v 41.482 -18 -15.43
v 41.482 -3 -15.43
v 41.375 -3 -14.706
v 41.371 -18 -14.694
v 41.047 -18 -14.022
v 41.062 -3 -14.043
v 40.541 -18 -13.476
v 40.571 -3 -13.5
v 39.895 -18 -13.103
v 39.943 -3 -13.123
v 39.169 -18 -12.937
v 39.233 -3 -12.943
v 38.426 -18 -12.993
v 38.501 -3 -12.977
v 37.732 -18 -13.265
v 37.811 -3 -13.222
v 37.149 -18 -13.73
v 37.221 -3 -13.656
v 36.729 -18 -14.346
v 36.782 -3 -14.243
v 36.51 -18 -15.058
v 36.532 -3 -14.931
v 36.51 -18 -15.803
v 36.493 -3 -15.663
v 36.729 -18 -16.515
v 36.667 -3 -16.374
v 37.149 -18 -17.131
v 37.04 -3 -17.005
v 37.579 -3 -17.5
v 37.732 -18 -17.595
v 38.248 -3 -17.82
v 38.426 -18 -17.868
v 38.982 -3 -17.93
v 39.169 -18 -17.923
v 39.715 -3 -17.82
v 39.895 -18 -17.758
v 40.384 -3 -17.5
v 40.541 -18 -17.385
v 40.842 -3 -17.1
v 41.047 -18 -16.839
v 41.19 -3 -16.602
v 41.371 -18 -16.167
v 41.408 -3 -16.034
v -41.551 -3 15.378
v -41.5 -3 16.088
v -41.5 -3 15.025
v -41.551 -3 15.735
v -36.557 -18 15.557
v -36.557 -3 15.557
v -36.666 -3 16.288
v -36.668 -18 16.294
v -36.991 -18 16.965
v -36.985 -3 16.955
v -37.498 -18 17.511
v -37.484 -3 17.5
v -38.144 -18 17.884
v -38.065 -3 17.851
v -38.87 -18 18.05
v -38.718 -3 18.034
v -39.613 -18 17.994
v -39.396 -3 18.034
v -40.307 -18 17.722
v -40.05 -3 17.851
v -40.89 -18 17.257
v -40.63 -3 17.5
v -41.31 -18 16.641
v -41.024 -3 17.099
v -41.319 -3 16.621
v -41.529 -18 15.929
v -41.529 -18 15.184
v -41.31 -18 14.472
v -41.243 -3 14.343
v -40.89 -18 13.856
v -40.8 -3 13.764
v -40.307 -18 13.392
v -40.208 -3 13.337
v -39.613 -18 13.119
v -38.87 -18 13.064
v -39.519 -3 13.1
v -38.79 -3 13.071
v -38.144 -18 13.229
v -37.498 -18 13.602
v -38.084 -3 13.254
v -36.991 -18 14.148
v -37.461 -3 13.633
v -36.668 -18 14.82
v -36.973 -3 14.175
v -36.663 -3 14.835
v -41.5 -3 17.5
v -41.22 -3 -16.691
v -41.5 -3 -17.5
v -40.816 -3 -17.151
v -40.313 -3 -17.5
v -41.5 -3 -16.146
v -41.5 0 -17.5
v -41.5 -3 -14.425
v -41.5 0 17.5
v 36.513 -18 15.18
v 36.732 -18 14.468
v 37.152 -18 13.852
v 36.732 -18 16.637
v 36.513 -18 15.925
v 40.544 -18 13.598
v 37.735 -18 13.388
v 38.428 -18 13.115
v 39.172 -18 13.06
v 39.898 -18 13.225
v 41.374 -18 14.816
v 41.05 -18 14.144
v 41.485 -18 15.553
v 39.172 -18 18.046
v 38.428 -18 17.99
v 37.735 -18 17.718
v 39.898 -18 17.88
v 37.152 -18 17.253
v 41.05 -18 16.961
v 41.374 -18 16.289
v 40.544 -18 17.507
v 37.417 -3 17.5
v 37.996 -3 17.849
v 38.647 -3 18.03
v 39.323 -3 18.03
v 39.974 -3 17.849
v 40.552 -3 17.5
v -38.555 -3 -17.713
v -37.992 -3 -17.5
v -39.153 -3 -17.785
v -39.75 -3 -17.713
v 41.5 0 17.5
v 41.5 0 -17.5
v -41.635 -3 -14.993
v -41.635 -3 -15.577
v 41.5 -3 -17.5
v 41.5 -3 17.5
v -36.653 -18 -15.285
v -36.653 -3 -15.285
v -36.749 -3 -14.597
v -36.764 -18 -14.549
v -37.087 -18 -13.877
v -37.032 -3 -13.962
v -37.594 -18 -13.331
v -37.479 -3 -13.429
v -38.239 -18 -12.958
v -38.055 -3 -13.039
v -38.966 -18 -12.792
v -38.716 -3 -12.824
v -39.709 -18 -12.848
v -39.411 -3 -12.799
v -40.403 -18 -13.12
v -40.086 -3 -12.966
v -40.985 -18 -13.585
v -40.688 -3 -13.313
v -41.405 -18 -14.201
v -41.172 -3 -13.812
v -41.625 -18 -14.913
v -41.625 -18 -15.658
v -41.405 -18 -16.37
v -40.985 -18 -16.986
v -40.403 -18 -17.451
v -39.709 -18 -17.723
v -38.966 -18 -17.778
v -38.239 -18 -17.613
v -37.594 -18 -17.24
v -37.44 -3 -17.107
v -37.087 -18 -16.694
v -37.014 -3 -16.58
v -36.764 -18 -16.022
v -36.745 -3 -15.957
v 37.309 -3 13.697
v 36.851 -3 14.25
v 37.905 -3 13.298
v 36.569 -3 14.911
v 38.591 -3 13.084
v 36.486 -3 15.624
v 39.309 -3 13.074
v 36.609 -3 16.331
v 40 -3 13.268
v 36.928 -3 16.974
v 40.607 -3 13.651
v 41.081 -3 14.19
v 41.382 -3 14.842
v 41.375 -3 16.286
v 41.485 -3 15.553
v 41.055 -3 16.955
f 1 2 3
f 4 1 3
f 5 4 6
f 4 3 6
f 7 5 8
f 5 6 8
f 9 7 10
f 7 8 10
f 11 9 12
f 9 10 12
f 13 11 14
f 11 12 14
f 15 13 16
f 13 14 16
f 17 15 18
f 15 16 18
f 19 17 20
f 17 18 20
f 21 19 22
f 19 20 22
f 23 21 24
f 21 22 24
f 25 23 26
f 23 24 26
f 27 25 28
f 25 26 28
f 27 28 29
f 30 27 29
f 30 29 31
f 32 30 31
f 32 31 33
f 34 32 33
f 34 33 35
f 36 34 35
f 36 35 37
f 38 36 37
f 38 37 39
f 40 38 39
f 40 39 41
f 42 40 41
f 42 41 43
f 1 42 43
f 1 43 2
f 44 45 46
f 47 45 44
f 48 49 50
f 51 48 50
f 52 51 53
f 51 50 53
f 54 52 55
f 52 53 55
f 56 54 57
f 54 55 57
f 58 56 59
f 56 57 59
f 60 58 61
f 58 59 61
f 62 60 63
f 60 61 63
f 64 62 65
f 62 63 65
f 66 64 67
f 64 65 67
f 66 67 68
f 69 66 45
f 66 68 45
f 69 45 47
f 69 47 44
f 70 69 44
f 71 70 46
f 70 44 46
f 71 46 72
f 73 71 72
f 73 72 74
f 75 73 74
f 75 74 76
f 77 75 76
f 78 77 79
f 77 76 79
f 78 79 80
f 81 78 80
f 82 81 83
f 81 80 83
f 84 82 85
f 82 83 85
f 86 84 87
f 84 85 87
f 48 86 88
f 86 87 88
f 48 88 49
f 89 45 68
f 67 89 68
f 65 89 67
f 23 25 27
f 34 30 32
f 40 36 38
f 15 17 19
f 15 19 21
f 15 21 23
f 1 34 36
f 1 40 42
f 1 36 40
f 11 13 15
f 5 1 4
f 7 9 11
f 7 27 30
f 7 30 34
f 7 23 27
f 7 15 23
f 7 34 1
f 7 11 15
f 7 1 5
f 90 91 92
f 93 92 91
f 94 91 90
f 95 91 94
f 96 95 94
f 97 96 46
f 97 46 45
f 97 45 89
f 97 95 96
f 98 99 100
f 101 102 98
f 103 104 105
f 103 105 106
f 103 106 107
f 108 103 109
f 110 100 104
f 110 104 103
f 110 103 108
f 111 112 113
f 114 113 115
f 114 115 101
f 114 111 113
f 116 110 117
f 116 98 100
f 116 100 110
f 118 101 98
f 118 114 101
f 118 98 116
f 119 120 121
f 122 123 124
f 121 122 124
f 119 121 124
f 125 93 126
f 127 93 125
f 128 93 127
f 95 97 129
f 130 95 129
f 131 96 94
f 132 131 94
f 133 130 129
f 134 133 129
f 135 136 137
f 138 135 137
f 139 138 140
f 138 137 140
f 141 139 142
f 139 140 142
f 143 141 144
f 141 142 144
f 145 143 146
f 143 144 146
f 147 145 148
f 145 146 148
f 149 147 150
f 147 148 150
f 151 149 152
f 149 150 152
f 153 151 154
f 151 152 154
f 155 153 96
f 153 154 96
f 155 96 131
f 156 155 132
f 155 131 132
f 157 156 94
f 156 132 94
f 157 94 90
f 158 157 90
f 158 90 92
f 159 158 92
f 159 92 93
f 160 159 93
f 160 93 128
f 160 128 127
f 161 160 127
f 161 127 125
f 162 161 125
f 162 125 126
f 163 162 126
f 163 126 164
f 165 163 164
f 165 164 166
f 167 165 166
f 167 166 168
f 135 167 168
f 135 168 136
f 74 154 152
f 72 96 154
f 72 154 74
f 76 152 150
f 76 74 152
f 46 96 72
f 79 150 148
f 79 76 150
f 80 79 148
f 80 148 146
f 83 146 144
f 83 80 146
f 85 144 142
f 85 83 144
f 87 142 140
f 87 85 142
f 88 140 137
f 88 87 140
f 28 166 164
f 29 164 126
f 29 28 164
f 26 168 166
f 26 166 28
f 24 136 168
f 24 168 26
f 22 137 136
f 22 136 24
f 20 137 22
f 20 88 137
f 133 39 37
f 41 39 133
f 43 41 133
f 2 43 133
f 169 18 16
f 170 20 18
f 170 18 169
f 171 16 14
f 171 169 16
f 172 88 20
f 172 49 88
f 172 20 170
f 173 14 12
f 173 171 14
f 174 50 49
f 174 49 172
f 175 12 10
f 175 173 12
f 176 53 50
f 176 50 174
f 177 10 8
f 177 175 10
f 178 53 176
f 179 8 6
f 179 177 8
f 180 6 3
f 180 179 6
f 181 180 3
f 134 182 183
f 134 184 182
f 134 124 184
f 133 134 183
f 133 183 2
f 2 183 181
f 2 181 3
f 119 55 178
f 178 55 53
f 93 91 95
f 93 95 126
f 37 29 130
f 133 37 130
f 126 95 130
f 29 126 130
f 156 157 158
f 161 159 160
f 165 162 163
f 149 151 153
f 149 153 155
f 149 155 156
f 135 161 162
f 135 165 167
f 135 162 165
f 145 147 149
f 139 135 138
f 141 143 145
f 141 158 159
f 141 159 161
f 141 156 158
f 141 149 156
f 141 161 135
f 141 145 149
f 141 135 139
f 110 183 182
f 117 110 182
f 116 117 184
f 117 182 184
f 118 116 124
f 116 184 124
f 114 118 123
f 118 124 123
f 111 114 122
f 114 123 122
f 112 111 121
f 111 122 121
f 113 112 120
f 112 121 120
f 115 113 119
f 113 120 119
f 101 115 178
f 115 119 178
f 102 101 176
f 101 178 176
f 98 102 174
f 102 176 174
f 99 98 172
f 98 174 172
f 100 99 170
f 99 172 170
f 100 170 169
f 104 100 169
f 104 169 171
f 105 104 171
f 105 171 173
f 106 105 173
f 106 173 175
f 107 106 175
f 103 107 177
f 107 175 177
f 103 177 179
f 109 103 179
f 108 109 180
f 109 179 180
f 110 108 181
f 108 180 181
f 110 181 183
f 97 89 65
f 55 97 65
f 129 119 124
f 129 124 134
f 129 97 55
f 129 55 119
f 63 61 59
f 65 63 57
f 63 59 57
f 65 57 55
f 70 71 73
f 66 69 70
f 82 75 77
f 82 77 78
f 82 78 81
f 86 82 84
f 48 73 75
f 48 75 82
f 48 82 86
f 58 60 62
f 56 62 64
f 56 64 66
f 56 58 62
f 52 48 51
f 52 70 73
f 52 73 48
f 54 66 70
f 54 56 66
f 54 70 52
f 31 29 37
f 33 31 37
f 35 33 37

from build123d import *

# Parameters (mm, degrees)
F0_W      = 83
F0_H      = 35
F1_DEPTH  = 3
F6_R      = 2.5
F7_DEPTH  = 15
F3_R      = 2.5
F8_DEPTH  = 15
F4_R      = 2.5
F9_DEPTH  = 15
F10_DEPTH = 15
F5_R      = 2.5
F11_DEPTH = 15


with BuildPart() as f1:
    # F0 (on Front) → F1 (new body)
    with BuildSketch(Plane.XZ):
        Rectangle(F0_W, F0_H)
    extrude(amount=F1_DEPTH)

    # F6 (on face) → F7 (join)
    with BuildSketch(Plane.XZ.offset(3)):
        with Locations((-39.1526, -15.285481)):
            Circle(F6_R)
    extrude(amount=F7_DEPTH)

    # F3 (on face) → F8 (join)
    with BuildSketch(Plane.XZ.offset(3)):
        with Locations((-39.057095, 15.556678)):
            Circle(F3_R)
    extrude(amount=F8_DEPTH)

    # F4 (on face) → F9 (join)
    with BuildSketch(Plane.XZ.offset(3)):
        with Locations((38.984798, 15.55259)):
            Circle(F4_R)
    extrude(amount=F9_DEPTH)

    # F6 (on face) → F10 (join)
    with BuildSketch(Plane.XZ.offset(3)):
        with Locations((-39.1526, -15.285481)):
            Circle(F6_R)
    extrude(amount=F10_DEPTH)

    # F5 (on face) → F11 (join)
    with BuildSketch(Plane.XZ.offset(3)):
        with Locations((38.981859, -15.430422)):
            Circle(F5_R)
    extrude(amount=F11_DEPTH)


solid = f1.part
